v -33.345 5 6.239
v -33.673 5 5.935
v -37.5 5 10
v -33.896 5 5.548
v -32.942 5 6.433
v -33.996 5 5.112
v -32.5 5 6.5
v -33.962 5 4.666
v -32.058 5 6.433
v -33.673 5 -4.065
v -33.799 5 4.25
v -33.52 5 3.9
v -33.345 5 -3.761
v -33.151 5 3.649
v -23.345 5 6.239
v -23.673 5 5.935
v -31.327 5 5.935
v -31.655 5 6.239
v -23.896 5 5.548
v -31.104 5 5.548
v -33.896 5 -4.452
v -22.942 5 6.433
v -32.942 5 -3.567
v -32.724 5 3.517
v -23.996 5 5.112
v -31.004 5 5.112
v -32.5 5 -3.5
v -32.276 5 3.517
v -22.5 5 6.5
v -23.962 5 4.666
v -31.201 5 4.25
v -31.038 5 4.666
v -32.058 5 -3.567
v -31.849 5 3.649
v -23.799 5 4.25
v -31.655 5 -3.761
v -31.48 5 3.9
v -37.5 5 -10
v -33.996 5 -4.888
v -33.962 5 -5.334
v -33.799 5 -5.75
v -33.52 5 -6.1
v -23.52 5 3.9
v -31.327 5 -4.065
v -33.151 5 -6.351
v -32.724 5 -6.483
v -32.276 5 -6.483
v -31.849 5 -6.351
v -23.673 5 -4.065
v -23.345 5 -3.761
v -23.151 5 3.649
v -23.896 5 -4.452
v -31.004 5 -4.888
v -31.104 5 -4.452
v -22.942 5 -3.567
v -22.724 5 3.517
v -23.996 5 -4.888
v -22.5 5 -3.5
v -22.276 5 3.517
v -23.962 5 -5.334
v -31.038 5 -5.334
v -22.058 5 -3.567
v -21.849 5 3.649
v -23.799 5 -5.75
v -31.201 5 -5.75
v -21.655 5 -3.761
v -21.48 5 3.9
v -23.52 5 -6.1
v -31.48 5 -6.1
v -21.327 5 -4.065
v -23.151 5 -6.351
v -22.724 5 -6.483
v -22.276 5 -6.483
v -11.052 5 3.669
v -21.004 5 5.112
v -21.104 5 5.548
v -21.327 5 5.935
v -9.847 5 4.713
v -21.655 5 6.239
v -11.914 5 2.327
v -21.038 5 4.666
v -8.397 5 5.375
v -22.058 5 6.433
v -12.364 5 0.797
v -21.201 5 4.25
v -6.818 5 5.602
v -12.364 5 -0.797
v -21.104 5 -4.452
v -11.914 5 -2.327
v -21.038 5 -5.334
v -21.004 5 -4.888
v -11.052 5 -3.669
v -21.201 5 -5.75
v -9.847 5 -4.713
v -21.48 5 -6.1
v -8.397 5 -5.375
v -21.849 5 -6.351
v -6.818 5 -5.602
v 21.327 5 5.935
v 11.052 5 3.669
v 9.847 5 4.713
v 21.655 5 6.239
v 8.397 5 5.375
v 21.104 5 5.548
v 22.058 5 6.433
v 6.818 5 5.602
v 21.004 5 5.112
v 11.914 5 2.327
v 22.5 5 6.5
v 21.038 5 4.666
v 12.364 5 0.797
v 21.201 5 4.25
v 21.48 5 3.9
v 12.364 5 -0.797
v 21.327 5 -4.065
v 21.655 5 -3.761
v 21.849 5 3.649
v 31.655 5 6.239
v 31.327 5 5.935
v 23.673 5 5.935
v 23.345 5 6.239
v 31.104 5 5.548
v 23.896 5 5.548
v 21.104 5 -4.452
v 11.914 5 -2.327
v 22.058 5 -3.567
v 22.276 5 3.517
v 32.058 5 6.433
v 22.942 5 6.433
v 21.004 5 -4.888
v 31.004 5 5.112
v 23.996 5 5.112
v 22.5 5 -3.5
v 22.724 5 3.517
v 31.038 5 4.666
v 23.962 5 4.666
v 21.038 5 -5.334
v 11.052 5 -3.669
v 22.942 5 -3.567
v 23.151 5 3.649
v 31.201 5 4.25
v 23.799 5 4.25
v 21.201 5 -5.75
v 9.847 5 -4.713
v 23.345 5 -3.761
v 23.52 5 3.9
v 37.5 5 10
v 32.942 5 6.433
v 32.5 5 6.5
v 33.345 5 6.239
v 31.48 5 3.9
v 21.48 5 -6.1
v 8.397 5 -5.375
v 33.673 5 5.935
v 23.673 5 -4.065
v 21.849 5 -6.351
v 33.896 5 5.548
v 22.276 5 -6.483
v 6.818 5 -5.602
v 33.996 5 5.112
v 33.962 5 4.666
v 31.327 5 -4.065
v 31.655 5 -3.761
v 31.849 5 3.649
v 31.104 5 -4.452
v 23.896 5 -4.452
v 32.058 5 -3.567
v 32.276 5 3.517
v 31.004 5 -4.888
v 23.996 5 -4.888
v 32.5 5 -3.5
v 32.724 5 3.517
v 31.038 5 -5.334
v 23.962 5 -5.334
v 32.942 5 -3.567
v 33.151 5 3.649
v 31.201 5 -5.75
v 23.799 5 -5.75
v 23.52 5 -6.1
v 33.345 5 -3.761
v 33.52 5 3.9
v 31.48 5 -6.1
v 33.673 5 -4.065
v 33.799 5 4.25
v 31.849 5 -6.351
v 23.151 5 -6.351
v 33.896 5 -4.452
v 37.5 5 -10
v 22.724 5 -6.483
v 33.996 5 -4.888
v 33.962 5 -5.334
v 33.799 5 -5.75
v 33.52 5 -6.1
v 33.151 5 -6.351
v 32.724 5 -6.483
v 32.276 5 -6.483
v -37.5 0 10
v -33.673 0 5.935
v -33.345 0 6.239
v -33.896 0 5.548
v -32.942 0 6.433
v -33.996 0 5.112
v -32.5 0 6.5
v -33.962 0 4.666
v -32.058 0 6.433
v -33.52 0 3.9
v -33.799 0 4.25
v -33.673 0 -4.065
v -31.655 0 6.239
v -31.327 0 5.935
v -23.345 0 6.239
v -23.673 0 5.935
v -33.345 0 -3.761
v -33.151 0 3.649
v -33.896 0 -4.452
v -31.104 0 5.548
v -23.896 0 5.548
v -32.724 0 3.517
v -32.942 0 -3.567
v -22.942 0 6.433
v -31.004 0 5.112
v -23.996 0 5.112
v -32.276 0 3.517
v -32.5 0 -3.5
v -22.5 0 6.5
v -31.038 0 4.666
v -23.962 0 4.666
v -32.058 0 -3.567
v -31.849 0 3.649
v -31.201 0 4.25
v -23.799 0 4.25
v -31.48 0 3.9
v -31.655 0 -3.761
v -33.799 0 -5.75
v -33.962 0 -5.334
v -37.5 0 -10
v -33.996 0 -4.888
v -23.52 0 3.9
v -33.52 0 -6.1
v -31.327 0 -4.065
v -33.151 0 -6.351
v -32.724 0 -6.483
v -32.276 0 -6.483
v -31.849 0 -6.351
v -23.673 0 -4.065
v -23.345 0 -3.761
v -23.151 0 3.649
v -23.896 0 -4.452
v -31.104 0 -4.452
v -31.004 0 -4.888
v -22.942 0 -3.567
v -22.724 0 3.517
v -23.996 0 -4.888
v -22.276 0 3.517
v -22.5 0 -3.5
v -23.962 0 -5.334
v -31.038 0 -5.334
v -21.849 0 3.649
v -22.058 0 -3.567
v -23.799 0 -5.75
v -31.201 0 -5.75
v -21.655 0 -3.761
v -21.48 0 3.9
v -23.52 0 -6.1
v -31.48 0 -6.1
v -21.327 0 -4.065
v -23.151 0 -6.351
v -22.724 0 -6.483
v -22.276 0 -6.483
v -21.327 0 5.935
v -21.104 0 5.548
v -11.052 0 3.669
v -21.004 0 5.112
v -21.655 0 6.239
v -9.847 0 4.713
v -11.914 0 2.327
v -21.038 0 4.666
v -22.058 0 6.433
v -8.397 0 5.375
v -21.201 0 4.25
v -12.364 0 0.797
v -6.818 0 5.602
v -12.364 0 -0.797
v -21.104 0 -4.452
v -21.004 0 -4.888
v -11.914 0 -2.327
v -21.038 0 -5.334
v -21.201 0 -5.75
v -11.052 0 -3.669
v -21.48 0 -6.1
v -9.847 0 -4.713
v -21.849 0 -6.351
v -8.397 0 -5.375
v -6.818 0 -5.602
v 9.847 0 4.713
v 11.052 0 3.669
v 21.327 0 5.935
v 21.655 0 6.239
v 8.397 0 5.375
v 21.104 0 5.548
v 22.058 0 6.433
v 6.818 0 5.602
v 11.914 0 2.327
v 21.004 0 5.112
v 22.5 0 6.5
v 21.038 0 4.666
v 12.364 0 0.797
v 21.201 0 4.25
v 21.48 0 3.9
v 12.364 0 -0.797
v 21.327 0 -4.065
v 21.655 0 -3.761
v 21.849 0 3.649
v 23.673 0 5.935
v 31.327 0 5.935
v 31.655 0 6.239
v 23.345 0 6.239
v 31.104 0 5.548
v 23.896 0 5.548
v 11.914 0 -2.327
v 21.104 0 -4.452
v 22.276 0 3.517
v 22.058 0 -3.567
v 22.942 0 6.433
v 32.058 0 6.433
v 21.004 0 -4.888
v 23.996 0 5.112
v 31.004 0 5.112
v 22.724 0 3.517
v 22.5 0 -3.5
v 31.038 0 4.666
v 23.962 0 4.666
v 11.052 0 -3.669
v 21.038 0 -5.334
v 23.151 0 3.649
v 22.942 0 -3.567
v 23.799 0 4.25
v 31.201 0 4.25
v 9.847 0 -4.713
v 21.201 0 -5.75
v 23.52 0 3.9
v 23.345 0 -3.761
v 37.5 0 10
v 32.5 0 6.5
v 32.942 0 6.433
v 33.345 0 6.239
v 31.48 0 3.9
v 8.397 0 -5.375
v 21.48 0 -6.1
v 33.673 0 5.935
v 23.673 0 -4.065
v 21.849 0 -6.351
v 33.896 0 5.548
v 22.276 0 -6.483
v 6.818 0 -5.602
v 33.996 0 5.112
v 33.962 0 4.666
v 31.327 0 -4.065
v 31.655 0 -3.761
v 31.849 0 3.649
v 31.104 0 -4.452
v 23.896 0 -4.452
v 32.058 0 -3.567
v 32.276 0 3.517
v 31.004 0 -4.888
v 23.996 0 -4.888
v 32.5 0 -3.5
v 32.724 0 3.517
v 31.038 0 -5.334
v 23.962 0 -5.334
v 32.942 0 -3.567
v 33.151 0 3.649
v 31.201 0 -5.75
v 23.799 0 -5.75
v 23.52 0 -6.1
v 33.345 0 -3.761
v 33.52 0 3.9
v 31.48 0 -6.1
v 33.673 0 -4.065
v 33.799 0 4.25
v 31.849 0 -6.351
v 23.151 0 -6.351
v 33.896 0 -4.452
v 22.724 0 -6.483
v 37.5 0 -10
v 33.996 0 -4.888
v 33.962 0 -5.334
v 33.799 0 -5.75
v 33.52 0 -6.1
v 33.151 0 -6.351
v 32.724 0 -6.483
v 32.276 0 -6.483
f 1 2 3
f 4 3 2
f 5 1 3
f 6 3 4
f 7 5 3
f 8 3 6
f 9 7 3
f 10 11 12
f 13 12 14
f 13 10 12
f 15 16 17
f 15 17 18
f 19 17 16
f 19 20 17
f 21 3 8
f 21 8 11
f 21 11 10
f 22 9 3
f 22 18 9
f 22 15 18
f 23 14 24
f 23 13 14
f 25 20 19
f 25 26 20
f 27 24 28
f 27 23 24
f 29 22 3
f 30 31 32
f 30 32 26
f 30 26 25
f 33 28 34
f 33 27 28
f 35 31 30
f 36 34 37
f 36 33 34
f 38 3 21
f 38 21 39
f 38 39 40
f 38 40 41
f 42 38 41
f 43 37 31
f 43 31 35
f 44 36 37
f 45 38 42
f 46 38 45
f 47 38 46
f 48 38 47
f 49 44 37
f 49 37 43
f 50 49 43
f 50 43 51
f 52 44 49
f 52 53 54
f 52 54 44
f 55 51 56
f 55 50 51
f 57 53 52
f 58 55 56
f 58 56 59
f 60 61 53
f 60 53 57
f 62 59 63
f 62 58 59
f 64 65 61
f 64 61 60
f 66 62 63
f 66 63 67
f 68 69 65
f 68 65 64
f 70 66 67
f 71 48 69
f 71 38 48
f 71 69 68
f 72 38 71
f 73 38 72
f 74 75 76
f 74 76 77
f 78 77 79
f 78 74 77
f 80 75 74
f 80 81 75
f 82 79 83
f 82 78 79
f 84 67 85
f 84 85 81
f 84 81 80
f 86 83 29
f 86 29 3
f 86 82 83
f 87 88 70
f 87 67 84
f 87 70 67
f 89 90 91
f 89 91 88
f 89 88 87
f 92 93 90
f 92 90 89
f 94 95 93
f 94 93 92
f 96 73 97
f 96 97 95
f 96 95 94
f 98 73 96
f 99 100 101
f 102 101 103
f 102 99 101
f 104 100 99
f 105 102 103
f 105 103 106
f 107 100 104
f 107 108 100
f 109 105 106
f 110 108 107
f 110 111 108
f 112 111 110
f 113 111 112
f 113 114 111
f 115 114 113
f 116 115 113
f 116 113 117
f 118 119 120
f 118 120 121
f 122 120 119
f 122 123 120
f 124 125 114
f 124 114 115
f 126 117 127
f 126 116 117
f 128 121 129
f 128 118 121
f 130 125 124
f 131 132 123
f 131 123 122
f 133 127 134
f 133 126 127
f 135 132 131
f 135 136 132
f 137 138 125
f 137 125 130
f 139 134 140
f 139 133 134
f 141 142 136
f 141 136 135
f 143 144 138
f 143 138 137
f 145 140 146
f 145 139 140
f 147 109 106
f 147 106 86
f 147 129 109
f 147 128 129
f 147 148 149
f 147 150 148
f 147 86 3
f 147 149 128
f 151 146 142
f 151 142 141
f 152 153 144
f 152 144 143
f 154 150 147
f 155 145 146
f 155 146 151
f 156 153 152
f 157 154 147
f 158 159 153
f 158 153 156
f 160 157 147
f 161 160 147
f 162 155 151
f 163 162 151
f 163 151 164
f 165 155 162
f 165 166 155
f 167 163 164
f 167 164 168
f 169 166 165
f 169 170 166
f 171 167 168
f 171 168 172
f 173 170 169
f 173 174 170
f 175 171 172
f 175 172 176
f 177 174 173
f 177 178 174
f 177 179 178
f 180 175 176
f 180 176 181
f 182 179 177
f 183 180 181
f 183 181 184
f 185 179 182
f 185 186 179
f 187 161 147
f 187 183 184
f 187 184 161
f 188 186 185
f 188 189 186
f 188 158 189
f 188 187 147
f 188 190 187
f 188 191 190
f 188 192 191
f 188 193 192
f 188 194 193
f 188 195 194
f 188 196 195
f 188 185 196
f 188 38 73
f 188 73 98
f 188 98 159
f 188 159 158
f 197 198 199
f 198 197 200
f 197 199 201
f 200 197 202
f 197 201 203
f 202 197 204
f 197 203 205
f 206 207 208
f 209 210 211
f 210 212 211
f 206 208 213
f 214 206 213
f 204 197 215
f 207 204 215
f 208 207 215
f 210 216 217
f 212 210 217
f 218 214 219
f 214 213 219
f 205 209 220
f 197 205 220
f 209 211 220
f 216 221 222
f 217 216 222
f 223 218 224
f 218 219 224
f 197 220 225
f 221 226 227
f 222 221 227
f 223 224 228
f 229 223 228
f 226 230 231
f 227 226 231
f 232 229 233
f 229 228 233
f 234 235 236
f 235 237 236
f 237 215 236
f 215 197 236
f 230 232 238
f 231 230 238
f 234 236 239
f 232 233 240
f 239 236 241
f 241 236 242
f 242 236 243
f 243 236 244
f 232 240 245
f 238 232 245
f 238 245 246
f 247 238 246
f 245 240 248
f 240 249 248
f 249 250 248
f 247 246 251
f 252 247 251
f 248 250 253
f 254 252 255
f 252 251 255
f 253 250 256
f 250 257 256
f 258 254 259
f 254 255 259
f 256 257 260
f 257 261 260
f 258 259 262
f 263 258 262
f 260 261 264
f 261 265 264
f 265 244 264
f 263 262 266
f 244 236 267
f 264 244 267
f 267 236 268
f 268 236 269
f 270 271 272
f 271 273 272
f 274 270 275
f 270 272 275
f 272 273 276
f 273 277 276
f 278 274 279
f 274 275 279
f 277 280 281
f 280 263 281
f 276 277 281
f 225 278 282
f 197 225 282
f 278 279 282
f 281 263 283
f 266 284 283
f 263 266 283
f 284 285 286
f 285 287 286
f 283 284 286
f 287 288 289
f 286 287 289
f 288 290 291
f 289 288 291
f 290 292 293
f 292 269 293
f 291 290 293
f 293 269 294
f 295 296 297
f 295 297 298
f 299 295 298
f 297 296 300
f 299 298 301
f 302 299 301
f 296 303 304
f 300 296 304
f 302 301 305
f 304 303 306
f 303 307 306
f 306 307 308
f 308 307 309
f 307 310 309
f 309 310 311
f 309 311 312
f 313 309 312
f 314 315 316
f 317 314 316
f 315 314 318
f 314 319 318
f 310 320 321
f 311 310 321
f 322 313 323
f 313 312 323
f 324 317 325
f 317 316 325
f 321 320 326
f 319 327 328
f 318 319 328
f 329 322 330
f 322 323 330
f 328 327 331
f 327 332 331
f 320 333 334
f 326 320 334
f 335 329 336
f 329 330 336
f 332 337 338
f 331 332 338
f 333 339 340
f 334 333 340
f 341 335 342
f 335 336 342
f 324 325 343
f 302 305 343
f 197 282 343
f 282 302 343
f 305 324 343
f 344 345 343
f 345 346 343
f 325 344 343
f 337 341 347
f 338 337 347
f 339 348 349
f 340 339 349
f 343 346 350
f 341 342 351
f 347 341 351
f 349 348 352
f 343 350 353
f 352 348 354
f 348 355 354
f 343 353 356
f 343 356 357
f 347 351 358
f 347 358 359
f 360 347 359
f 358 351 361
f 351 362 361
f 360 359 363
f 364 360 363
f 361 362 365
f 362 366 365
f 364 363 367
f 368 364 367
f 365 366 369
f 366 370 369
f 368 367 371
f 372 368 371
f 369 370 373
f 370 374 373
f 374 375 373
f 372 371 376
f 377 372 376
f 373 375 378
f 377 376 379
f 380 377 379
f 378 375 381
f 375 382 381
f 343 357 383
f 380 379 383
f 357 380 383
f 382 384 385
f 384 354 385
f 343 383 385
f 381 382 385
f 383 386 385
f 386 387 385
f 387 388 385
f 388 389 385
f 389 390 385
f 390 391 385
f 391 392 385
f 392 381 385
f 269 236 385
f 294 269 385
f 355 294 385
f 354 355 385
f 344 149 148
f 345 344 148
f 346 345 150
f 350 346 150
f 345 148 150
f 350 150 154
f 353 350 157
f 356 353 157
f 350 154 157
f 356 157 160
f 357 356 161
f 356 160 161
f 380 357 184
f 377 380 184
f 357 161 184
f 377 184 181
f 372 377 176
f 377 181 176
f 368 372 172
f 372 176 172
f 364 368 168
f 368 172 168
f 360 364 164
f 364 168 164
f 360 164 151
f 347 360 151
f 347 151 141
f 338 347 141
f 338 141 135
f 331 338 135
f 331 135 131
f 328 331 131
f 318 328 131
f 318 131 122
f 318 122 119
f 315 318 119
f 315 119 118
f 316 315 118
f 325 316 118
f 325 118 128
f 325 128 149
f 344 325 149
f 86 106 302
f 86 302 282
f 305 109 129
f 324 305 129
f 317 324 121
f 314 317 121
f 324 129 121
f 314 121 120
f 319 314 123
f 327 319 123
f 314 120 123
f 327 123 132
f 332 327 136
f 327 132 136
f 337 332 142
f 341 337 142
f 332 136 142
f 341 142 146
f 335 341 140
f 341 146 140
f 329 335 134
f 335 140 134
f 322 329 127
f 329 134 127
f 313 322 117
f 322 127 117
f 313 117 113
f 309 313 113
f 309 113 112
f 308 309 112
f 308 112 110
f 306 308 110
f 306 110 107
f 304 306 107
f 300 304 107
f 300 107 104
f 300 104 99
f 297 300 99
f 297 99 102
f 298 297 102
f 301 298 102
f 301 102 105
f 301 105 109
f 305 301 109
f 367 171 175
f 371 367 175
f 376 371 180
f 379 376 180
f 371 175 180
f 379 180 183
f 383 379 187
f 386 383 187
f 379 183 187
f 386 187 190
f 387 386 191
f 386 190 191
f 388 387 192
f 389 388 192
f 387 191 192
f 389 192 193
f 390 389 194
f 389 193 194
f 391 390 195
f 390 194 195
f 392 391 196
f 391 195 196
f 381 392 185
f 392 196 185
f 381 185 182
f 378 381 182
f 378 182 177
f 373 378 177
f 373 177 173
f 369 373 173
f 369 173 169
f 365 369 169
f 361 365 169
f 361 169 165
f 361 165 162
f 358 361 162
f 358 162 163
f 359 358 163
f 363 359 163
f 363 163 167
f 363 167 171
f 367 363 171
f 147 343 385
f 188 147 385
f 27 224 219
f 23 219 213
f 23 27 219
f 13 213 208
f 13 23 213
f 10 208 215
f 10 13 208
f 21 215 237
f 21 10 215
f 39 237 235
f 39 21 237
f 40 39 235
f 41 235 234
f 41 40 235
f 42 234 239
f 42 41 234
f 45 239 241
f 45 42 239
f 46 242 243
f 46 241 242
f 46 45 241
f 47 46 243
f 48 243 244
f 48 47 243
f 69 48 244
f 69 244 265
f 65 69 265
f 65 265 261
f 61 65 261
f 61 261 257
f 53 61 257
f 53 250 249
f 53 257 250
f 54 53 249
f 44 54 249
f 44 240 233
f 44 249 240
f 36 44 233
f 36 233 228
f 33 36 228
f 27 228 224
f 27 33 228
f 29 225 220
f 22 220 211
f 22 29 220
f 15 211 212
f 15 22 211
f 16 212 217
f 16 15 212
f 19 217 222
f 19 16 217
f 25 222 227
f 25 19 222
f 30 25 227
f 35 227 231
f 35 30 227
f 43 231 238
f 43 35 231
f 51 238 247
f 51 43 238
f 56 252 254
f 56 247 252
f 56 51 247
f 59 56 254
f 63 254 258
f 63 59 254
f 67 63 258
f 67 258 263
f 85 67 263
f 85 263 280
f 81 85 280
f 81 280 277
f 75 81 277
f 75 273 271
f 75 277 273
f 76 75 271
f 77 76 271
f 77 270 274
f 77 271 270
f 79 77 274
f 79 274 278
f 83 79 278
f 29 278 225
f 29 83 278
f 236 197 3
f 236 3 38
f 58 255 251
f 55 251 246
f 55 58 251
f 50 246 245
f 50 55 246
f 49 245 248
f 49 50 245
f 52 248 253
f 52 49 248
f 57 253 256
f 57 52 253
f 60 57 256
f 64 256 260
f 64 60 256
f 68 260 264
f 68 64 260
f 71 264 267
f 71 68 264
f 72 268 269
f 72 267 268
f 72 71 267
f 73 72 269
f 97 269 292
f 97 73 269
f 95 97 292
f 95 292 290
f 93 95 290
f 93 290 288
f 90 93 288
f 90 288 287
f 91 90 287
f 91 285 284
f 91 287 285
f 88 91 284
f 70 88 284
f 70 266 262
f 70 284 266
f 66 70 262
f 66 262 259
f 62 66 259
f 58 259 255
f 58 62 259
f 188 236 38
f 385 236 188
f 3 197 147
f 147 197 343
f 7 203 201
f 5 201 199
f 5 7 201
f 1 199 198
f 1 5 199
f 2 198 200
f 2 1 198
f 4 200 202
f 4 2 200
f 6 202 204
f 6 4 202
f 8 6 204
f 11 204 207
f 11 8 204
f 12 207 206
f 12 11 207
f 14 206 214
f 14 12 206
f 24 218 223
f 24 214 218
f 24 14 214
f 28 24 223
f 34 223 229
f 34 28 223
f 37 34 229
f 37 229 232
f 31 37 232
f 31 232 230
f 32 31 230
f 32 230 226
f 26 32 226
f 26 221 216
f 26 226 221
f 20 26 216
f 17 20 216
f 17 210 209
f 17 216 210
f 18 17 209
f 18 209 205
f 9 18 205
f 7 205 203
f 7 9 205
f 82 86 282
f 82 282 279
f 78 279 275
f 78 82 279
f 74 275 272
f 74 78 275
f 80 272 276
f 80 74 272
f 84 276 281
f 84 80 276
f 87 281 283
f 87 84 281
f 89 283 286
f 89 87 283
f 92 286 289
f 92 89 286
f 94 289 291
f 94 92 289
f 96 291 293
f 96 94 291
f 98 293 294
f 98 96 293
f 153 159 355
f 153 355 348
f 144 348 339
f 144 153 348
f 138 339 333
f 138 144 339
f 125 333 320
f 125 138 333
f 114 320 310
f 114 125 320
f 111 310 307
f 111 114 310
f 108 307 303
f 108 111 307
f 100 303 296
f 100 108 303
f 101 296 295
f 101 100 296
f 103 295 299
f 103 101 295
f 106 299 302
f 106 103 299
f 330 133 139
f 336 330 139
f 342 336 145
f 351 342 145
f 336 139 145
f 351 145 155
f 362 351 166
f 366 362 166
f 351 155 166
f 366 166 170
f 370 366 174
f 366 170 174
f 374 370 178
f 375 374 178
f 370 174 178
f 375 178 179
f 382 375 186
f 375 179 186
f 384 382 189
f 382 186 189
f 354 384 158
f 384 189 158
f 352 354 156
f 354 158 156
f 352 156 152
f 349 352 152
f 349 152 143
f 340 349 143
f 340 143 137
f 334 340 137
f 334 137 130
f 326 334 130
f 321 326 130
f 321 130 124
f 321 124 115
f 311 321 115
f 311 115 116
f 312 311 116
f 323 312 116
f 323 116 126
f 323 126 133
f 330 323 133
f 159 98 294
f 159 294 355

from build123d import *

# Parameters (mm, degrees)
SKETCH_1_W          = 75
SKETCH_1_H          = 20
EXTRUDE_1_DEPTH     = 5
SKETCH_2_R          = 1.5
CUT_EXTRUDE_1_DEPTH = 40.131189606
CUT_EXTRUDE_2_DEPTH = 40.131189606


with BuildPart() as part:
    # 草图1 → 凸台-拉伸1 (new body)
    with BuildSketch(Plane(origin=(0, 0, 0), x_dir=(1, 0, 0), z_dir=(0, 1, 0))):
        Rectangle(SKETCH_1_W, SKETCH_1_H)
    extrude(amount=EXTRUDE_1_DEPTH)

    # 草图2 → 切除-拉伸1 (cut, through all)
    with BuildSketch(Plane(origin=(0, 5, 0), x_dir=(1, 0, 0), z_dir=(0, 1, 0))):
        with Locations(Location((22.5, 5, 0), (0, 0, 270))):
            Circle(SKETCH_2_R)
        with Locations(Location((32.5, 5, 0), (0, 0, 270))):
            Circle(SKETCH_2_R)
        with Locations(Location((22.5, -5, 0), (0, 0, 270))):
            Circle(SKETCH_2_R)
        with Locations(Location((32.5, -5, 0), (0, 0, 270))):
            Circle(SKETCH_2_R)
    cut_extrude_1 = extrude(amount=-CUT_EXTRUDE_1_DEPTH, mode=Mode.SUBTRACT)

    # 草图3 → 切除-拉伸2 (cut, through all)
    with BuildSketch(Plane(origin=(0, 5, 0), x_dir=(1, 0, 0), z_dir=(0, 1, 0))):
        with BuildLine():
            Line((6.81829997, -5.602297427), (-6.81829997, -5.602297427))
            ThreePointArc((-6.81829997, -5.602297427), (-12.420597397, 0), (-6.81829997, 5.602297427))
            Line((-6.81829997, 5.602297427), (6.81829997, 5.602297427))
            ThreePointArc((6.81829997, 5.602297427), (12.420597397, 0), (6.81829997, -5.602297427))
        make_face()
    extrude(amount=-CUT_EXTRUDE_2_DEPTH, mode=Mode.SUBTRACT)

    # 镜向1: 切除-拉伸1 across plane
    add(cut_extrude_1.mirror(Plane(origin=(0, 0, 0), x_dir=(0, 0, 1), z_dir=(1, 0, 0))), mode=Mode.SUBTRACT)


solid = part.part
